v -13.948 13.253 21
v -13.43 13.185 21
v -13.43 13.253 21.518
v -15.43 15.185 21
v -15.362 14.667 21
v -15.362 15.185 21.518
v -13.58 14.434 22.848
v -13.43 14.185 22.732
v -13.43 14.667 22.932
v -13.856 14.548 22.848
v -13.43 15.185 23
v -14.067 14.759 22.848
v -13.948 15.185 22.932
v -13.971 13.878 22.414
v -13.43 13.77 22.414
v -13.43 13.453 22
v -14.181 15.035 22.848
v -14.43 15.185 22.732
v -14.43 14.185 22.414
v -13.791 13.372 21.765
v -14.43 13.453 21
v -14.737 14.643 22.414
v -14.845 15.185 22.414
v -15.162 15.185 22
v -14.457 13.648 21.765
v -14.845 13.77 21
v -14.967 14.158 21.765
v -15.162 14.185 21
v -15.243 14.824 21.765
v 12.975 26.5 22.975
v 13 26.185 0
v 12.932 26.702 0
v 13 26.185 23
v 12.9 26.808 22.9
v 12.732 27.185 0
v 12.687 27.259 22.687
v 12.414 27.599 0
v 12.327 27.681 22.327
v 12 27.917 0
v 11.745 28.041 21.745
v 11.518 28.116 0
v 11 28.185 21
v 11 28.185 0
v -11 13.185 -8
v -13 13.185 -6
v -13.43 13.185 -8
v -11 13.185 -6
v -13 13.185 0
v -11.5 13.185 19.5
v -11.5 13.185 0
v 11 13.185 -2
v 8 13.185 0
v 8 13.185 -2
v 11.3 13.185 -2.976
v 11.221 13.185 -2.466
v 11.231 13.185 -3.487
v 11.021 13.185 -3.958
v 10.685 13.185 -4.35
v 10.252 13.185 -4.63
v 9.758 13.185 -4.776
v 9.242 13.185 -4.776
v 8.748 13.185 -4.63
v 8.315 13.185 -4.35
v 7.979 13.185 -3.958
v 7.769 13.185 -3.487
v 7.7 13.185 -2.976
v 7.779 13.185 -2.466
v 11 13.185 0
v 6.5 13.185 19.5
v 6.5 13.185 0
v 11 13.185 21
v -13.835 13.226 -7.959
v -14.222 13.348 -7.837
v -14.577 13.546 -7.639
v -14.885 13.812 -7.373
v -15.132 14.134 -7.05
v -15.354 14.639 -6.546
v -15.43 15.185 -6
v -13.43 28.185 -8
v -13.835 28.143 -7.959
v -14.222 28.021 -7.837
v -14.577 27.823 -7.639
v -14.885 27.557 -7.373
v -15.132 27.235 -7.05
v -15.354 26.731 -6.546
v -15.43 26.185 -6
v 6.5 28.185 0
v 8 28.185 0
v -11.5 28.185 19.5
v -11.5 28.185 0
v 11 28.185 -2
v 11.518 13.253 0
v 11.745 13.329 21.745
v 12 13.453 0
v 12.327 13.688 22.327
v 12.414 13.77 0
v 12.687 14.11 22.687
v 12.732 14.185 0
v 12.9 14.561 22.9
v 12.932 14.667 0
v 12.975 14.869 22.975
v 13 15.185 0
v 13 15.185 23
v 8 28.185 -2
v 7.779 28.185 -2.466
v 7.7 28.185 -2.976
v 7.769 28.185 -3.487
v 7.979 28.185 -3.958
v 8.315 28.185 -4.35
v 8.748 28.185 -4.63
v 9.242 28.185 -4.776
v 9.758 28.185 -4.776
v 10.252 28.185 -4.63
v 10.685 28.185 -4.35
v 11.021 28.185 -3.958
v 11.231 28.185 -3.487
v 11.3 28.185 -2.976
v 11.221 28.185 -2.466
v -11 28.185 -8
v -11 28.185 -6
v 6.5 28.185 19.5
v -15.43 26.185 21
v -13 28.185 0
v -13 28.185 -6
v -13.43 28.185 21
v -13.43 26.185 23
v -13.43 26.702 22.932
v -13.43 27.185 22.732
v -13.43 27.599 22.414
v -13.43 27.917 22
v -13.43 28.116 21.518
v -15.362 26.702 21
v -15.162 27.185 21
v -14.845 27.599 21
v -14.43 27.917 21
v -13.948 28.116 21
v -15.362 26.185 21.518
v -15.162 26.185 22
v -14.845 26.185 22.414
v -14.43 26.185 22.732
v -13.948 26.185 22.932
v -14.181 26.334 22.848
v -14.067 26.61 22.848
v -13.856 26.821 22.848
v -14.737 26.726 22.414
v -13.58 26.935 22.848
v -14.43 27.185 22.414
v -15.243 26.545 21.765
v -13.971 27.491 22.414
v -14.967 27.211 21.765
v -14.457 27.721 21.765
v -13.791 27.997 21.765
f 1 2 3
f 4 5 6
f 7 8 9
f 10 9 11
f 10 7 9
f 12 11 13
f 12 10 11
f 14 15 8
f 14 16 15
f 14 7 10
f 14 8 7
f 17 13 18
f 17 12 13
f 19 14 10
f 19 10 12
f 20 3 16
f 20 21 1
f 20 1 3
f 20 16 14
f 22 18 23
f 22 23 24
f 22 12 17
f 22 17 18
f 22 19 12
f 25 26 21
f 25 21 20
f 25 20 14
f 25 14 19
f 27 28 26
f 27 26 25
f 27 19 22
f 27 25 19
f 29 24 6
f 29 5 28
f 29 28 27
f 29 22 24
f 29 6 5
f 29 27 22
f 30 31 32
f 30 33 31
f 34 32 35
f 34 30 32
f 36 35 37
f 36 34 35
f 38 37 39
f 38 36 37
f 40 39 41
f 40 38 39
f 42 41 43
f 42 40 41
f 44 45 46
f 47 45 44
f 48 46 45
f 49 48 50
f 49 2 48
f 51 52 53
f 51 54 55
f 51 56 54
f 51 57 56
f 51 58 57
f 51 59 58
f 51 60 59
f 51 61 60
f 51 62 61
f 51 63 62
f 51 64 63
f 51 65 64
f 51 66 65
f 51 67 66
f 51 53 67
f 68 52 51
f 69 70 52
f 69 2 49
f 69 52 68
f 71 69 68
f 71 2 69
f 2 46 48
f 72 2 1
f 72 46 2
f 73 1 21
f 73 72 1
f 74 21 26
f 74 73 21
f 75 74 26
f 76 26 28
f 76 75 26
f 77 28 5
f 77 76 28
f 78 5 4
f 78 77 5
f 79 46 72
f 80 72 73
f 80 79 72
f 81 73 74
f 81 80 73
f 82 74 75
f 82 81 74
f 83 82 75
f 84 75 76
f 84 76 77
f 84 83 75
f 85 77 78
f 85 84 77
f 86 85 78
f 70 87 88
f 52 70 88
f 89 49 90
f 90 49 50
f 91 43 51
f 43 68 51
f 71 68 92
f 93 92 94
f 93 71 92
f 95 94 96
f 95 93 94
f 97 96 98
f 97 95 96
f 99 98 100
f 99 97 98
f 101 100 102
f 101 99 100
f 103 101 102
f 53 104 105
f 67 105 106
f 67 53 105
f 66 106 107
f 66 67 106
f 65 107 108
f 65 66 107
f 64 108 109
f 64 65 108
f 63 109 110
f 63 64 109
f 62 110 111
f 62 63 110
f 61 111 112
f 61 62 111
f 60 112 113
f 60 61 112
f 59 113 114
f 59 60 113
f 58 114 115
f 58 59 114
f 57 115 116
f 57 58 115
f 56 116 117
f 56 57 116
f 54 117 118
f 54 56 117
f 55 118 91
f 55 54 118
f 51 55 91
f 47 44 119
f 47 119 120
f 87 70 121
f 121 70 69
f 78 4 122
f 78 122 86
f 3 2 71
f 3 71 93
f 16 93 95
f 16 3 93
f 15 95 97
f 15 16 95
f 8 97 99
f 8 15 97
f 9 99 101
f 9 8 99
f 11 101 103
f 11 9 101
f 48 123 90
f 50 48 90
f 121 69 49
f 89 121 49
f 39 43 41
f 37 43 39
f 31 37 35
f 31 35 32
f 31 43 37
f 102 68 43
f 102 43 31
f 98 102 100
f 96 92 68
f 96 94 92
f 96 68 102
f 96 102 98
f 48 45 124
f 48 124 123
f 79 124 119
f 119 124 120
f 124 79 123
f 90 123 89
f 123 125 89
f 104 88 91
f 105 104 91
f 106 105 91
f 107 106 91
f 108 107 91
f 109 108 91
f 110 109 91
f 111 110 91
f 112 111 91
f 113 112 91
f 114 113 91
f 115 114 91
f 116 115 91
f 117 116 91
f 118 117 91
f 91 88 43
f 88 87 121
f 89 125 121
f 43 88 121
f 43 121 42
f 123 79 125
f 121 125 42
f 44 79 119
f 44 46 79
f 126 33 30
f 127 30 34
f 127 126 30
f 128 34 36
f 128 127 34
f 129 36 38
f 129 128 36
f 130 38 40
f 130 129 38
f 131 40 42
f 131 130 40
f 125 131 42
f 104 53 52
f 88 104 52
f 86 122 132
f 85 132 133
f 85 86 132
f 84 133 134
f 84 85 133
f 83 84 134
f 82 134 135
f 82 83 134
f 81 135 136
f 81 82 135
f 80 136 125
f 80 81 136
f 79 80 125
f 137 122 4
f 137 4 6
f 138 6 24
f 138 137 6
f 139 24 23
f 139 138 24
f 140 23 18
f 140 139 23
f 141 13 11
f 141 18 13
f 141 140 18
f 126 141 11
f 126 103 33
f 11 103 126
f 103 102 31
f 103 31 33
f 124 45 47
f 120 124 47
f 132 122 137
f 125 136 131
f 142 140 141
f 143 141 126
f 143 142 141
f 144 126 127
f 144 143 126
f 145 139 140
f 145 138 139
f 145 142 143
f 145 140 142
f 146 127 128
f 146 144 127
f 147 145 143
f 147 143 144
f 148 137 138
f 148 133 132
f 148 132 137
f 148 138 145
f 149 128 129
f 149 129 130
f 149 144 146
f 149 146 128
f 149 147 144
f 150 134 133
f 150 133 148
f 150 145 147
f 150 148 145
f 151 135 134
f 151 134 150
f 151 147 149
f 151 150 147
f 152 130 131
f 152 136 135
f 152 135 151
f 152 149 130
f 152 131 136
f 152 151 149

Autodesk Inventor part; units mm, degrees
ref_plane "YZ Plane" through (0, 0, 0) normal (1, 0, 0) x (0, 1, 0)
ref_plane "XZ Plane" through (0, 0, 0) normal (0, 1, 0) x (-1, 0, 0)
ref_plane "XY Plane" through (0, 0, 0) normal (0, 0, 1) x (1, 0, 0)
ref_plane "РабПлоскость1" through (-0.858, 10.5846, 17.8317) normal (0, -1, 0) x (1, 0, 0)
ref_plane "РабПлоскость2" through (4.892, 13.1846, 45.3317) normal (0, 1, 0) x (1, 0, 0)
sketch "Эскиз1" plane through (-0.858, 13.1846, 17.8317) normal (0, -1, 0) x (1, 0, 0)
  arc A0 (8.858, -19.8317) -> (11.858, -19.8317) centre (10.358, -20.8267) ccw projected
  line L0 (8.858, -19.8317) -> (8.858, -17.8317) projected
  line L1 (11.858, -17.8317) -> (11.858, -19.8317) projected
  line L2 (11.958, -17.8317) -> (11.958, -21.4012)
  arc A1 (8.958, -21.7911) -> (11.958, -21.4012) centre (10.358, -20.8267) ccw
  line L3 (8.958, -21.7911) -> (8.958, -17.8317)
  line L4 (11.858, -17.8317) -> (13.858, -17.8317) projected
  line L5 (4.858, -17.8317) -> (8.858, -17.8317) projected
  line L6 (7.358, -19.8317) -> (7.358, 1.6683) projected
  line L7 (7.358, 1.6683) -> (-10.642, 1.6683) projected
  line L8 (-10.642, 1.6683) -> (-10.642, -19.8317) projected
  line L9 (-12.142, -17.8317) -> (-8.142, -17.8317) projected
  line L10 (-12.142, -23.8317) -> (-12.142, -17.8317) projected
  line L11 (13.858, -17.8317) -> (13.858, 5.1683)
  line L12 (13.858, 5.1683) -> (-14.5723, 5.1683)
  line L13 (-14.5723, 5.1683) -> (-14.5723, -25.8317)
  line L14 (-14.5723, -25.8317) -> (-10.142, -25.8317)
  line L15 (-10.142, -25.8317) -> (-10.142, -23.8317)
  line L16 (-12.142, -23.8317) -> (-10.142, -23.8317)
  line L17 (8.858, -17.8317) -> (8.958, -17.8317)
  line L18 (11.858, -17.8317) -> (11.958, -17.8317)
  point P0 (0.858, -17.8317)
  point P1 (-10.642, -17.8317)
  point P2 (7.358, -17.8317)
  point P3 (19.5, 6.5781)
  point P4 (19.5, 4.3408)
  point P5 (1.1058, 1.6683)
  point P6 (19.1666, -17.8317)
  point P7 (11.858, -18.4138)
  point P8 (-4.2637, -11.6345)
  point P9 (-4.2637, 1.6683)
  dimension "d0" = 0.1
  dimension "d1" = 23
  dimension "d2" = 2
  dimension "d3" = 2
extrude "Выдавливание1" add sketch "Эскиз1" against normal blind 15 contours L0 L17 L3 A1 L2 A0 | L2 A1 L3 L17 L5 L6 L7 L8 L9 L10 L16 L15 L14 L13 L12 L11 L4 L1 A0
fillet "Сопряжение1" radius 2 8 edges at (-15.4303, 20.6846, -8) (-15.4303, 13.1846, 7.5) (-15.4303, 28.1846, 7.5) (-15.4303, 20.6846, 23) (-1.2151, 13.1846, 23) (-1.2151, 28.1846, 23) (13, 13.1846, 11.5) (13, 28.1846, 11.5)
properties part number "ЛЦМК.30000.10.00.03 Крышка передняя"
